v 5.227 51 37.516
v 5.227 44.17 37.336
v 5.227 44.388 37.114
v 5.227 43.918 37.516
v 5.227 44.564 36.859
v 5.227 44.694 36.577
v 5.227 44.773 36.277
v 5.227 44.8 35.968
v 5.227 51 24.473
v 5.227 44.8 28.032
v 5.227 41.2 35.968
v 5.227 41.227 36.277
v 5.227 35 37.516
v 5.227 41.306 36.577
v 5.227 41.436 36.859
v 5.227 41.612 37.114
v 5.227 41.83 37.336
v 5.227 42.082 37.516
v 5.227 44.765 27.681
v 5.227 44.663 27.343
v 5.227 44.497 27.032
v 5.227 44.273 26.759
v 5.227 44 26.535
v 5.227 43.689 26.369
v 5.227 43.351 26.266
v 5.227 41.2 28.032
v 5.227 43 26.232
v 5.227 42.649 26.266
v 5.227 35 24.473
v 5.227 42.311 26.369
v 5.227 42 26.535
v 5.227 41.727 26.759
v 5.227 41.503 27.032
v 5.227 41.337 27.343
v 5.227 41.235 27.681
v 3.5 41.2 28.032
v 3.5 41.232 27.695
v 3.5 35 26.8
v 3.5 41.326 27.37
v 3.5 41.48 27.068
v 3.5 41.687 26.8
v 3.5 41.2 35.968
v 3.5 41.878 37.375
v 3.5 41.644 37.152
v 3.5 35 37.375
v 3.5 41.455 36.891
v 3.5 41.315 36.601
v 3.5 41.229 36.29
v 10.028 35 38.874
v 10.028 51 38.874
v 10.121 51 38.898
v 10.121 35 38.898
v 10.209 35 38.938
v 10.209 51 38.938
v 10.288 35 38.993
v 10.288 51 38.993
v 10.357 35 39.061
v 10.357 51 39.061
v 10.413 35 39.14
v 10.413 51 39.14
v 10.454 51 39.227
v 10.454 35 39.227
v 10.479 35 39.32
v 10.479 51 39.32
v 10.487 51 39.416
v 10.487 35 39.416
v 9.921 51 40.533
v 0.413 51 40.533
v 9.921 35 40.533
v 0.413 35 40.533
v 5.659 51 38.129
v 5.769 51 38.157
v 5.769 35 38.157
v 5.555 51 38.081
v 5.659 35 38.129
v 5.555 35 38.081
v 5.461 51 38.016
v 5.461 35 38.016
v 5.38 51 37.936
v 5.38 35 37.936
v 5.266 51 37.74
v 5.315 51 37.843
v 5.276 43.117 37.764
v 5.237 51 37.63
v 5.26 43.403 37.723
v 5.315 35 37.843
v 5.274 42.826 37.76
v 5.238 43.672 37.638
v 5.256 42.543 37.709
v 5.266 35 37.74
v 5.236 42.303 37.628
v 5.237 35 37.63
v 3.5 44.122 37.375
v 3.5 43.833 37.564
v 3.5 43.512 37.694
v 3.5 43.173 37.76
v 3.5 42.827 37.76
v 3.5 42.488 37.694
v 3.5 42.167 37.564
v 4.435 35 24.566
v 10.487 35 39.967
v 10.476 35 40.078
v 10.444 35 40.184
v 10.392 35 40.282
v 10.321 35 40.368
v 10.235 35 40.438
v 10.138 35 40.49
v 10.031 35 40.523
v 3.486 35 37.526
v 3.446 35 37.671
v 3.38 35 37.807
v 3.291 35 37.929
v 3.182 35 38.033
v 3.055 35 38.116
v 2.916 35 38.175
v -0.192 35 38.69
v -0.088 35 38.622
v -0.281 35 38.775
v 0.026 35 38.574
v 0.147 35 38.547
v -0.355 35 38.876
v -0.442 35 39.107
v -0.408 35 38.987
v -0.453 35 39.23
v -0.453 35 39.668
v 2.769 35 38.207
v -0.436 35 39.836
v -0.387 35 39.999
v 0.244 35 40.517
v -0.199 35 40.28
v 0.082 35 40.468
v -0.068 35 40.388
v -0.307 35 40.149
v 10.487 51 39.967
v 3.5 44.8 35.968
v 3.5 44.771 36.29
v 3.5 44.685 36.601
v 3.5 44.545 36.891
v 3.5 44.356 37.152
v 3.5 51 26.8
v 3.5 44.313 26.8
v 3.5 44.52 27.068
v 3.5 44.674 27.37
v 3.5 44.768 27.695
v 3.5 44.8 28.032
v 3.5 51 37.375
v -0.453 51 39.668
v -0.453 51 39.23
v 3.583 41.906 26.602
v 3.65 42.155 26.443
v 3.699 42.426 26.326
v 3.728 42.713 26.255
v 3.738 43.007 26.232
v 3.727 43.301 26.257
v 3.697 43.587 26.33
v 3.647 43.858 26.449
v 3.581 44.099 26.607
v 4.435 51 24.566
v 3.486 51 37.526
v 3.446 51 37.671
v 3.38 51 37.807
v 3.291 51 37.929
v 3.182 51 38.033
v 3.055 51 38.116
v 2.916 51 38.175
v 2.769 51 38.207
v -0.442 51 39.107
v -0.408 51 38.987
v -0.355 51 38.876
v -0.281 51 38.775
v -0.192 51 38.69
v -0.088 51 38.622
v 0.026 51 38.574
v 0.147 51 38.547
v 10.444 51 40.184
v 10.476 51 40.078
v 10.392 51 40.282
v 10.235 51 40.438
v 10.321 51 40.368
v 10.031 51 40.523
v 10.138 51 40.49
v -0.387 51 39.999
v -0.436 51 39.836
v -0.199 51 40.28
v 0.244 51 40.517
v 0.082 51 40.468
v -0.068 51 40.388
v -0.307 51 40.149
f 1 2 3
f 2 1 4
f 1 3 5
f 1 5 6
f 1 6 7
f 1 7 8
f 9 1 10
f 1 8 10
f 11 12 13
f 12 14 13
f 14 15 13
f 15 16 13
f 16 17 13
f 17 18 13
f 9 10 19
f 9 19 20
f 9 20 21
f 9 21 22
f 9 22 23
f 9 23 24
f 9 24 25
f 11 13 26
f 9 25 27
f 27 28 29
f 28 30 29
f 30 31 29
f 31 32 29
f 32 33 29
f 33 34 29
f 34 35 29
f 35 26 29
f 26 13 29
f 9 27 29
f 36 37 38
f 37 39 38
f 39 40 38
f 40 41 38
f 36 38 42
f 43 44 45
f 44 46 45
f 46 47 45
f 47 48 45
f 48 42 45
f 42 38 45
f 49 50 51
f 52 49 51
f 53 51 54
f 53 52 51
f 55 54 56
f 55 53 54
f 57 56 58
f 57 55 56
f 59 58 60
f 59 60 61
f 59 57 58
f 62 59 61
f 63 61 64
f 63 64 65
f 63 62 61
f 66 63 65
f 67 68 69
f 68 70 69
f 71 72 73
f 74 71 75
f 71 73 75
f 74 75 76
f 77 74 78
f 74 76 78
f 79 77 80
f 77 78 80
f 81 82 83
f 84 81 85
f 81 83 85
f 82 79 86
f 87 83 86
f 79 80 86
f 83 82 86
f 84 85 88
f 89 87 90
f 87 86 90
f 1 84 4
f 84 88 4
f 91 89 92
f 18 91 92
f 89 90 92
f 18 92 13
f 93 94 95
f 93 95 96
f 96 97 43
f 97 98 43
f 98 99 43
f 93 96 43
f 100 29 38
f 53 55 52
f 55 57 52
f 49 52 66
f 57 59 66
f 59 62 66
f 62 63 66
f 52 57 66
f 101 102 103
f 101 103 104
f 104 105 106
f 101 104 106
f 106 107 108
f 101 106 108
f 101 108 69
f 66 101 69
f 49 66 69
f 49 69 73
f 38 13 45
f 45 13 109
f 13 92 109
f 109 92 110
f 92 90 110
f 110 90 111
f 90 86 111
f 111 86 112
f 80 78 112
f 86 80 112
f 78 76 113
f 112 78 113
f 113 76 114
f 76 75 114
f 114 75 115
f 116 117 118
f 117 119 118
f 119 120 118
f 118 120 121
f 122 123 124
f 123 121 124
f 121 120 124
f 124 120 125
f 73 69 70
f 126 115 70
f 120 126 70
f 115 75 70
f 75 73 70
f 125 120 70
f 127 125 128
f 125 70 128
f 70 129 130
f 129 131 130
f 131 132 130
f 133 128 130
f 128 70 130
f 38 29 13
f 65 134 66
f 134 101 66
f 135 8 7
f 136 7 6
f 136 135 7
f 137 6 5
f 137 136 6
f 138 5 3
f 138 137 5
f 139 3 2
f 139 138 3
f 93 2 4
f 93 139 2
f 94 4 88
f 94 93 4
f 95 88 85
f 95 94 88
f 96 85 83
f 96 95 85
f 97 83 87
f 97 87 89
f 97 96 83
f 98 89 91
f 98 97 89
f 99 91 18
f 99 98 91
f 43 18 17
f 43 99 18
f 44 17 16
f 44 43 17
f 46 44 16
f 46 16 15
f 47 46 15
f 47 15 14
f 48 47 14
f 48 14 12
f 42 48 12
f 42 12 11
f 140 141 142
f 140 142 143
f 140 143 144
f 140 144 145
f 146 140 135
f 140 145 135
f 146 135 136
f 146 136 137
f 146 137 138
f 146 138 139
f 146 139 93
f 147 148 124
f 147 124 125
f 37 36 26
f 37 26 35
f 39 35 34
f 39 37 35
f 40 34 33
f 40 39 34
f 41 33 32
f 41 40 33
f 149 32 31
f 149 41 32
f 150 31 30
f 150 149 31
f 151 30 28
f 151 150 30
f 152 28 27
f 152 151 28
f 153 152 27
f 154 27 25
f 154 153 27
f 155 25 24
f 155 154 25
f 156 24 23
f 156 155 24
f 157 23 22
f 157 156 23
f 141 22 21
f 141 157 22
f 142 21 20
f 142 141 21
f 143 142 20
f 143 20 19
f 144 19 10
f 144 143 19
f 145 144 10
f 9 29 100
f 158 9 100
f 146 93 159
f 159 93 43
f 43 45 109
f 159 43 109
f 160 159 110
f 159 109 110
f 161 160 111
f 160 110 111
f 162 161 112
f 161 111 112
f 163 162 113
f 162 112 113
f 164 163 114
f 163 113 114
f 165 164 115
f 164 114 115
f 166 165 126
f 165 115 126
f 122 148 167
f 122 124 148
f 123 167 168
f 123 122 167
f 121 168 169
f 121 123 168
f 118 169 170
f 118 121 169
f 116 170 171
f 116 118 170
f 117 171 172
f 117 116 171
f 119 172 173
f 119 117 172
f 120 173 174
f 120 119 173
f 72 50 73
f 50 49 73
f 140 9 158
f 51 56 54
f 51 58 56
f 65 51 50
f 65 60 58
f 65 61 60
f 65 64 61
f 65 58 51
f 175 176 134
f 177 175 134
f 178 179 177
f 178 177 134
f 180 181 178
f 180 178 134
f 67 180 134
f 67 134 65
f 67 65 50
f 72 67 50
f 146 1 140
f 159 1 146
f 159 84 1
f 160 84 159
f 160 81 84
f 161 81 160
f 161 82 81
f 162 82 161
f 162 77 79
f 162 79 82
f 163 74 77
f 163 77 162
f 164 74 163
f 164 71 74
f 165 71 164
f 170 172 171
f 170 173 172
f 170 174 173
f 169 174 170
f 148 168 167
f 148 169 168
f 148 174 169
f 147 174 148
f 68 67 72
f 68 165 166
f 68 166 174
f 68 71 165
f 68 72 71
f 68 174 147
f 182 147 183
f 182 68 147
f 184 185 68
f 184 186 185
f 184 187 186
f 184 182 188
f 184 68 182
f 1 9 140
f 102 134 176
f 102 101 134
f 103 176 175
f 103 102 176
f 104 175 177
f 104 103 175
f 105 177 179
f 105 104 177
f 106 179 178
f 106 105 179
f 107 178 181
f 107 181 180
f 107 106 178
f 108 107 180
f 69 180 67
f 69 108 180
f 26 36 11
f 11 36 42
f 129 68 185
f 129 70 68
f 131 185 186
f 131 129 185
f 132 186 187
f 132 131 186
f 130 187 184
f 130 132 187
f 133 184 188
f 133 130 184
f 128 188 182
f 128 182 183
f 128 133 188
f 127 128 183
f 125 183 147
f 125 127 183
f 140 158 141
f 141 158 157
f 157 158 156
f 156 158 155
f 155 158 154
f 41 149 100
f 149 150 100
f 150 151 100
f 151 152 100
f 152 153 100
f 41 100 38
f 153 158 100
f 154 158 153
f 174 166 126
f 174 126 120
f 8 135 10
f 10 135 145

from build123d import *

# Parameters (mm, degrees)
EXTRUDE_DEPTH    = 10
EXTRUDE001_DEPTH = 8


with BuildPart() as syringe_lock_bolt_hole_extrude:
    # Sketch002 → Extrude (new body)
    with BuildSketch(Plane.YZ):
        with BuildLine():
            Line((-1.8, -3.968126), (-1.8, 3.968126))
            ThreePointArc((1.8, 3.968126), (0, 5.768126), (-1.8, 3.968126))
            Line((1.8, 3.968126), (1.8, -3.968126))
            ThreePointArc((-1.8, -3.968126), (0, -5.768126), (1.8, -3.968126))
        make_face()
    extrude(amount=EXTRUDE_DEPTH)


with BuildPart() as syringe_lock_cut:
    # Sketch003 → Extrude001 (new body, symmetric)
    with BuildSketch(Plane.XZ):
        with BuildLine():
            Line((0.935284, -7.43412), (0, -5.199585))
            Line((0, -5.199585), (0, 5.375387))
            ThreePointArc((0, 5.375387), (-0.208788, 5.929256), (-0.731243, 6.207474))
            Line((-0.731243, 6.207474), (-3.352588, 6.54707))
            ThreePointArc((-3.952758, 7.230008), (-3.781394, 6.775418), (-3.352588, 6.54707))
            Line((-3.952758, 7.230008), (-3.952758, 7.667555))
            ThreePointArc((-3.086826, 8.533487), (-3.699132, 8.279861), (-3.952758, 7.667555))
            Line((-3.086826, 8.533487), (6.420806, 8.533487))
            ThreePointArc((6.987146, 7.967147), (6.821269, 8.36761), (6.420806, 8.533487))
            Line((6.987146, 7.967147), (6.987146, 7.416219))
            ThreePointArc((6.528064, 6.873501), (6.856982, 7.060797), (6.987146, 7.416219))
            Line((6.528064, 6.873501), (2.268866, 6.157352))
            ThreePointArc((2.268866, 6.157352), (1.880407, 5.936152), (1.726681, 5.516392))
            Line((1.726681, 5.516392), (1.726681, -7.527226))
            Line((1.726681, -7.527226), (0.935284, -7.43412))
        make_face()
    extrude(amount=EXTRUDE001_DEPTH, both=True)

    # Cut011: cut syringe lock bolt hole extrude
    add(syringe_lock_bolt_hole_extrude.part, mode=Mode.SUBTRACT)


with BuildPart() as syringe_lock_cut_1:
    # Cut011 placement: moved
    add(syringe_lock_cut.part.moved(Location((3.5, 43, 32))))


solid = syringe_lock_cut_1.part
